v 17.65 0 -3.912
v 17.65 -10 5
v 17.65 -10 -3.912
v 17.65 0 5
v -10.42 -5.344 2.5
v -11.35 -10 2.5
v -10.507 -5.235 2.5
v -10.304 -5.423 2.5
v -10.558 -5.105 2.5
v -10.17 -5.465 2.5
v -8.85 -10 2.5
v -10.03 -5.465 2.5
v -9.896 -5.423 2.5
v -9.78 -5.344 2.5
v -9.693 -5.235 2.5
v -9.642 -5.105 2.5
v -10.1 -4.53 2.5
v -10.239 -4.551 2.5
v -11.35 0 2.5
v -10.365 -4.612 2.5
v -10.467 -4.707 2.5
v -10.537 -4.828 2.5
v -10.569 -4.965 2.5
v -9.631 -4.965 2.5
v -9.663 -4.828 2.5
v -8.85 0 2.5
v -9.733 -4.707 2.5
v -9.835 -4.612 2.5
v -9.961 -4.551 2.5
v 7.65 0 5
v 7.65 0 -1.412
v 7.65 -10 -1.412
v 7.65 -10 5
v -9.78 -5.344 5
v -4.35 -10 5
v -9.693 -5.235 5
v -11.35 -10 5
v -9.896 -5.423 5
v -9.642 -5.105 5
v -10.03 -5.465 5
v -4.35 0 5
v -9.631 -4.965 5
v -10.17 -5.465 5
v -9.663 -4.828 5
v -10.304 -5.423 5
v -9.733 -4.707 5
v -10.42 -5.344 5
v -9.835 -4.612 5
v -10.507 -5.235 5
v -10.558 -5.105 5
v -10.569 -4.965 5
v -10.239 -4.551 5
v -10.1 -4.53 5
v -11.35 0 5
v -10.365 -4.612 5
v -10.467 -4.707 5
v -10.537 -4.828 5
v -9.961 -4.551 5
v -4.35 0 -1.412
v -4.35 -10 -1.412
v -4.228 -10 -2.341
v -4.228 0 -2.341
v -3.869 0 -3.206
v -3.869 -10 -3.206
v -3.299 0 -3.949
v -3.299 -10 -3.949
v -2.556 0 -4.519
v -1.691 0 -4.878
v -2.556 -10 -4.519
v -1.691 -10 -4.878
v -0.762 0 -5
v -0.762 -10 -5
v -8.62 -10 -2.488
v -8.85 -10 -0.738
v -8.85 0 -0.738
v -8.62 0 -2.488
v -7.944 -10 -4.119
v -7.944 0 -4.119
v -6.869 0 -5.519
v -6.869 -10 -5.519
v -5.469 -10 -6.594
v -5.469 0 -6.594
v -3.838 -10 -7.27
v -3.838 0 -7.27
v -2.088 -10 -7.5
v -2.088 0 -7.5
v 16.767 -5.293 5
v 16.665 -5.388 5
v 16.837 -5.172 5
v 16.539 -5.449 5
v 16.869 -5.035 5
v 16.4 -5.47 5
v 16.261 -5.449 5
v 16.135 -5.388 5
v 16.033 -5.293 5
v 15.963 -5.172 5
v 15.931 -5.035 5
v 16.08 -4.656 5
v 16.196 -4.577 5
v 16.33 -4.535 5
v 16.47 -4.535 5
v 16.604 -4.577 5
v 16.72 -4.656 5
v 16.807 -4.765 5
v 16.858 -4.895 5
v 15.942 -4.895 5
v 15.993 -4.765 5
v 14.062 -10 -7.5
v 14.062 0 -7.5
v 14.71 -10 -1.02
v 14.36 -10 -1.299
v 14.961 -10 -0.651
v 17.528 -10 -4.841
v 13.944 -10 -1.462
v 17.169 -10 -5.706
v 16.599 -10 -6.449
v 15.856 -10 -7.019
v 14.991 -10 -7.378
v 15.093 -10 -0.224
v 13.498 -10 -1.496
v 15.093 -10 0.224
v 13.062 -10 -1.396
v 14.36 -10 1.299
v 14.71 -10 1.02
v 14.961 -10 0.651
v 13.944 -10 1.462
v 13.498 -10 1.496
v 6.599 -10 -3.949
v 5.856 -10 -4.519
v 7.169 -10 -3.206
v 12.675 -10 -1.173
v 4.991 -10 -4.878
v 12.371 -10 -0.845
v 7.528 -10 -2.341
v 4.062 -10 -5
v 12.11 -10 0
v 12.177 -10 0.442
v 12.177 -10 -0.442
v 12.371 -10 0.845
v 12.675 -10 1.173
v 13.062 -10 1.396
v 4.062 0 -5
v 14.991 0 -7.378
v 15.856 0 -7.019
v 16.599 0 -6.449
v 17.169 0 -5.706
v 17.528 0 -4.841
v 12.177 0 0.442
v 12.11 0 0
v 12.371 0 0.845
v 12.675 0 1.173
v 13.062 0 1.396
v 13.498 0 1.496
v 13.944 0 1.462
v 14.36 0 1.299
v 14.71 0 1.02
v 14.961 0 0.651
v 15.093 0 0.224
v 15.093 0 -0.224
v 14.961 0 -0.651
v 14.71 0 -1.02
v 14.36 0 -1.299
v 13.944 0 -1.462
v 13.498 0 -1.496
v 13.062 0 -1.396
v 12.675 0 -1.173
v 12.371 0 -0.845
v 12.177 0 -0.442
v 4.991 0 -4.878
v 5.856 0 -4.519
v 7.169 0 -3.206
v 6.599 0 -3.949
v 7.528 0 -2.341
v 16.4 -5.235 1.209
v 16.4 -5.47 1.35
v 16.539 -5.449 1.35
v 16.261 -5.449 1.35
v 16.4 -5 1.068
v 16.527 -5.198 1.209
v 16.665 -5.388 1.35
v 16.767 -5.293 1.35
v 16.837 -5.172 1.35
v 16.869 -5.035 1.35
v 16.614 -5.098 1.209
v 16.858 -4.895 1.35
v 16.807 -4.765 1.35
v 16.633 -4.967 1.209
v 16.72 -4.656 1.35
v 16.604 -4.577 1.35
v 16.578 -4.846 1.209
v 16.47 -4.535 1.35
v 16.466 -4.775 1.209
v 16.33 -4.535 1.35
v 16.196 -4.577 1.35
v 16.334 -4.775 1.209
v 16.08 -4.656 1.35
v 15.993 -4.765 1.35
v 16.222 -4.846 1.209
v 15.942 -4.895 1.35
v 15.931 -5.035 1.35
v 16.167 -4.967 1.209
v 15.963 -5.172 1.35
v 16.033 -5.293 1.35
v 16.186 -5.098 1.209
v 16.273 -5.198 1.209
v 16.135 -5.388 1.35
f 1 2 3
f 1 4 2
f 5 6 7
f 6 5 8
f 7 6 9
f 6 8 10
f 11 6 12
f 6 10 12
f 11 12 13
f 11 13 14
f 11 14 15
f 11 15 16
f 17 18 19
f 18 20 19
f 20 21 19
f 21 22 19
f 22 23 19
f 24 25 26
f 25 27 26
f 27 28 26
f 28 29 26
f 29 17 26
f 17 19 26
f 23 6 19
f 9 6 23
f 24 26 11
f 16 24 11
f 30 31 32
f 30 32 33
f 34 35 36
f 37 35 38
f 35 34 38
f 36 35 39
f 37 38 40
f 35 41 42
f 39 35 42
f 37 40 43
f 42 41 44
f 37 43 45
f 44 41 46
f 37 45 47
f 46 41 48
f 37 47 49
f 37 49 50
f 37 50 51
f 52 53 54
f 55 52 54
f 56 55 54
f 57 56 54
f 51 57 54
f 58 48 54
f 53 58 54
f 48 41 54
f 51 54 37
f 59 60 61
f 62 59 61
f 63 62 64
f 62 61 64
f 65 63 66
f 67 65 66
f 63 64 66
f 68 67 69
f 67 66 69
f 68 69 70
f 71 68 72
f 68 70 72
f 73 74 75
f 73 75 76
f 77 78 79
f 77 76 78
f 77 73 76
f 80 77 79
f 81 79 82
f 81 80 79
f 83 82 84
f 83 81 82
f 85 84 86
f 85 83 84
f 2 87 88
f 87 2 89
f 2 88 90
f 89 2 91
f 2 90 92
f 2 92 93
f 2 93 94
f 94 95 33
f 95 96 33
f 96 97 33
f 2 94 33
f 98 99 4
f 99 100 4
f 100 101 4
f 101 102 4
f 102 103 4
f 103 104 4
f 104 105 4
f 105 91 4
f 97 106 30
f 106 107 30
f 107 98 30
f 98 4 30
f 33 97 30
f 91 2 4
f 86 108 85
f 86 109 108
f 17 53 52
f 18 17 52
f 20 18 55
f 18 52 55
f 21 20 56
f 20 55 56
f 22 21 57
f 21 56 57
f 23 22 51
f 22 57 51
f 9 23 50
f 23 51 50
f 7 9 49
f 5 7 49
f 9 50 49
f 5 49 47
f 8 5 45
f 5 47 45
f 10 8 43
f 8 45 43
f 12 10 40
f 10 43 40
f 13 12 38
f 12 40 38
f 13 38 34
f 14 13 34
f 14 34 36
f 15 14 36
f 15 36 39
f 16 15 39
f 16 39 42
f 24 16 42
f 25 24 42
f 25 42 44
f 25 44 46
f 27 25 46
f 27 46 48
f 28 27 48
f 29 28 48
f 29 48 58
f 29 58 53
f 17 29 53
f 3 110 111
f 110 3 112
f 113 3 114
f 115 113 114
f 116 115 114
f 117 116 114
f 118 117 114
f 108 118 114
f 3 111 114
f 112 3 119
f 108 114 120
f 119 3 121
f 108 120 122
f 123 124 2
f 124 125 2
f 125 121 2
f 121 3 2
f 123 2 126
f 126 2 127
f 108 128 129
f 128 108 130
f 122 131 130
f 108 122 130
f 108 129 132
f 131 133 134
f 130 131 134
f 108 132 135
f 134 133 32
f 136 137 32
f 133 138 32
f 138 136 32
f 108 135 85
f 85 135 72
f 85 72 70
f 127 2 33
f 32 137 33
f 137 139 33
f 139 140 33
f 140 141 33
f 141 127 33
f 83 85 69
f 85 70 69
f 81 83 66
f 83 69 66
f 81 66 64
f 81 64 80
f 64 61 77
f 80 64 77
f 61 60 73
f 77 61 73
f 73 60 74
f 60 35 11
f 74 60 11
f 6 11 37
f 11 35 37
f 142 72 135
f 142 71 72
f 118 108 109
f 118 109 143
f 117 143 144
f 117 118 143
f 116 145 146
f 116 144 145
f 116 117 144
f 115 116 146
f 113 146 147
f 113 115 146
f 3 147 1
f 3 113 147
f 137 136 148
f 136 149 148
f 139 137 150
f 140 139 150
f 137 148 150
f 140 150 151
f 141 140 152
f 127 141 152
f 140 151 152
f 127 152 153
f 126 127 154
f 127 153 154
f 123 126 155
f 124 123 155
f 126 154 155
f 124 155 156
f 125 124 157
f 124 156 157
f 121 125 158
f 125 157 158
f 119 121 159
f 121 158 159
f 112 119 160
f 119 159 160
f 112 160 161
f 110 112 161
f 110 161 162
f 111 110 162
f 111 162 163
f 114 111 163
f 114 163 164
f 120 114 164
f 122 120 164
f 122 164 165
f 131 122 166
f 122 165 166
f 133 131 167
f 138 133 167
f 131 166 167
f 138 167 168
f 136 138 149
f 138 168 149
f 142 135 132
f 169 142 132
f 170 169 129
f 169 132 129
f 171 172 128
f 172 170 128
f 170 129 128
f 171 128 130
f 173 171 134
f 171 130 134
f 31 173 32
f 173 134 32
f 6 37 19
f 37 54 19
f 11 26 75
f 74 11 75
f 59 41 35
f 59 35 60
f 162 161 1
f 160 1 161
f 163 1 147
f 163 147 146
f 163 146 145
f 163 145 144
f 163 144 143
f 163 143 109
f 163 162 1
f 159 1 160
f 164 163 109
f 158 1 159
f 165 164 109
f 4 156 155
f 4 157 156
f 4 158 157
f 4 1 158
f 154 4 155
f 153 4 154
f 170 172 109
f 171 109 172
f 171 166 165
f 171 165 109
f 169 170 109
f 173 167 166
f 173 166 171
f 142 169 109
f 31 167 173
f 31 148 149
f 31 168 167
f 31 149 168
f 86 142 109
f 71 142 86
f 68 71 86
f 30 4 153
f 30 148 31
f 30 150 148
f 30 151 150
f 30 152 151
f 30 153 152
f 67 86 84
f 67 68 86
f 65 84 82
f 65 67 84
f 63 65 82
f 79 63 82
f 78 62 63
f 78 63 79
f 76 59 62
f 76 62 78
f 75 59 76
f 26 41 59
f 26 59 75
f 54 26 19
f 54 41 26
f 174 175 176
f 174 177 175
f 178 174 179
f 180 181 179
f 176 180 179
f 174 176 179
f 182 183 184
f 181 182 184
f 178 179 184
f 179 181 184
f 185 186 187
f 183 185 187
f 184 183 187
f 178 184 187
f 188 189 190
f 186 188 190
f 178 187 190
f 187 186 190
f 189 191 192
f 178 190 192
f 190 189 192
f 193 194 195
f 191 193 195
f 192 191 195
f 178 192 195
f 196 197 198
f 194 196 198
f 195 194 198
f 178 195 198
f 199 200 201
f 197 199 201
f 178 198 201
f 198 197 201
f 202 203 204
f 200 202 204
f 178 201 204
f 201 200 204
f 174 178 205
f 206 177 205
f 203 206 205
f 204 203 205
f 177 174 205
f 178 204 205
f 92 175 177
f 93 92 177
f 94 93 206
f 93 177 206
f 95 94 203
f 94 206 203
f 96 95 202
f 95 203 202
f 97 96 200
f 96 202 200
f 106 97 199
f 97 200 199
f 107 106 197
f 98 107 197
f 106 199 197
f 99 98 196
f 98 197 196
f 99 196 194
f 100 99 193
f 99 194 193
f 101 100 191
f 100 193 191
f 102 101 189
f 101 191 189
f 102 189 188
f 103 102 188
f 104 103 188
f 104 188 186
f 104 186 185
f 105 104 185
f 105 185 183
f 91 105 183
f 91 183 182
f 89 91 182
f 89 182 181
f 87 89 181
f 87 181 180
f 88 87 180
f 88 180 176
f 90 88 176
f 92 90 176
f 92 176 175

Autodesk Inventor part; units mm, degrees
ref_plane "YZ Plane" through (0, 0, 0) normal (1, 0, 0) x (0, 1, 0)
ref_plane "XZ Plane" through (0, 0, 0) normal (0, 1, 0) x (-1, 0, 0)
ref_plane "XY Plane" through (0, 0, 0) normal (0, 0, 1) x (1, 0, 0)
sketch "Sketch1" plane through (0, 0, 0) normal (0, 1, 0) x (-1, 0, 0)
  line L0 (4.35, -5) -> (-7.65, -5)
  line L1 (-7.65, -5) -> (-7.65, 5)
  line L2 (-7.65, 5) -> (4.35, 5)
  line L3 (4.35, 5) -> (4.35, -5)
  line L4 (4.35, -5) -> (-7.65, 5) construction
  line L5 (-7.65, -5) -> (4.35, 5) construction
  line L6 (4.35, 5) -> (11.35, 5)
  line L7 (11.35, 5) -> (11.35, 2.5)
  line L8 (11.35, 2.5) -> (8.85, 2.5)
  line L9 (8.85, 2.5) -> (8.85, -7.5)
  line L10 (-7.45, -7.5) -> (8.85, -7.5)
  line L11 (-7.65, 5) -> (-7.45, 5)
  line L12 (-17.65, 5) -> (-17.65, -7.5)
  line L13 (-17.65, -7.5) -> (-7.45, -7.5)
  line L14 (-17.65, 5) -> (-7.45, 5)
  circle A0 centre (-13.61, 0) radius 1.5
  dimension "d29" = 10
  dimension "d30" = 7
  dimension "d31" = 2.5
  dimension "d32" = 2.5
  dimension "d33" = 10
  dimension "d34" = 90
  dimension "d40" = 12
  dimension "d70" = 3
extrude "Extrusion9" add sketch "Sketch1" against normal blind 10 contours L3 L6 L7 L8 L9 L10 L13 L12 L14 L1 L0
fillet "Fillet7" radius 3.5875 2 edges at (-4.35, -5, -5) (7.65, -5, -5)
fillet "Fillet9" radius 3.5875 1 edges at (17.65, -5, -7.5)
fillet "Fillet10" radius 6.7625 1 edges at (-8.85, -5, -7.5)
sketch "Sketch5" plane through (-11.35, -10, 2.5) normal (0, 0, -1) x (-1, 0, 0)
  line L0 (-0.5, 0) -> (-0.5, 10) projected
  point P0 (-11.35, 10)
  point P1 (-0.5, 5)
sketch "Sketch6" plane through (-8.85, 0, 2.5) normal (0, 0, -1) x (-1, 0, 0)
  line L0 (2.5, -10) -> (0, -10) projected
  point P0 (-8.85, 0)
  point P1 (1.25, -5)
hole "Hole1" at (-10.1, -5, 2.5) direction (0, 0, 1) diameter 0.9398 depth 3.65 tip angle 118 thread size "120-102 UNM" class "2B" standard "ANSI Unified Screw Threads"
sketch "Sketch7" plane through (7.65, 0, 5) normal (0, 0, 1) x (1, 0, 0)
  point P0 (-7.65, 0)
  point P1 (8.75, -5)
hole "Hole2" at (16.4, -5, 5) direction (0, 0, -1) diameter 0.9398 depth 3.65 tip angle 118 thread size "120-102 UNM" class "2B" standard "ANSI Unified Screw Threads"
properties part number "chassis3"
